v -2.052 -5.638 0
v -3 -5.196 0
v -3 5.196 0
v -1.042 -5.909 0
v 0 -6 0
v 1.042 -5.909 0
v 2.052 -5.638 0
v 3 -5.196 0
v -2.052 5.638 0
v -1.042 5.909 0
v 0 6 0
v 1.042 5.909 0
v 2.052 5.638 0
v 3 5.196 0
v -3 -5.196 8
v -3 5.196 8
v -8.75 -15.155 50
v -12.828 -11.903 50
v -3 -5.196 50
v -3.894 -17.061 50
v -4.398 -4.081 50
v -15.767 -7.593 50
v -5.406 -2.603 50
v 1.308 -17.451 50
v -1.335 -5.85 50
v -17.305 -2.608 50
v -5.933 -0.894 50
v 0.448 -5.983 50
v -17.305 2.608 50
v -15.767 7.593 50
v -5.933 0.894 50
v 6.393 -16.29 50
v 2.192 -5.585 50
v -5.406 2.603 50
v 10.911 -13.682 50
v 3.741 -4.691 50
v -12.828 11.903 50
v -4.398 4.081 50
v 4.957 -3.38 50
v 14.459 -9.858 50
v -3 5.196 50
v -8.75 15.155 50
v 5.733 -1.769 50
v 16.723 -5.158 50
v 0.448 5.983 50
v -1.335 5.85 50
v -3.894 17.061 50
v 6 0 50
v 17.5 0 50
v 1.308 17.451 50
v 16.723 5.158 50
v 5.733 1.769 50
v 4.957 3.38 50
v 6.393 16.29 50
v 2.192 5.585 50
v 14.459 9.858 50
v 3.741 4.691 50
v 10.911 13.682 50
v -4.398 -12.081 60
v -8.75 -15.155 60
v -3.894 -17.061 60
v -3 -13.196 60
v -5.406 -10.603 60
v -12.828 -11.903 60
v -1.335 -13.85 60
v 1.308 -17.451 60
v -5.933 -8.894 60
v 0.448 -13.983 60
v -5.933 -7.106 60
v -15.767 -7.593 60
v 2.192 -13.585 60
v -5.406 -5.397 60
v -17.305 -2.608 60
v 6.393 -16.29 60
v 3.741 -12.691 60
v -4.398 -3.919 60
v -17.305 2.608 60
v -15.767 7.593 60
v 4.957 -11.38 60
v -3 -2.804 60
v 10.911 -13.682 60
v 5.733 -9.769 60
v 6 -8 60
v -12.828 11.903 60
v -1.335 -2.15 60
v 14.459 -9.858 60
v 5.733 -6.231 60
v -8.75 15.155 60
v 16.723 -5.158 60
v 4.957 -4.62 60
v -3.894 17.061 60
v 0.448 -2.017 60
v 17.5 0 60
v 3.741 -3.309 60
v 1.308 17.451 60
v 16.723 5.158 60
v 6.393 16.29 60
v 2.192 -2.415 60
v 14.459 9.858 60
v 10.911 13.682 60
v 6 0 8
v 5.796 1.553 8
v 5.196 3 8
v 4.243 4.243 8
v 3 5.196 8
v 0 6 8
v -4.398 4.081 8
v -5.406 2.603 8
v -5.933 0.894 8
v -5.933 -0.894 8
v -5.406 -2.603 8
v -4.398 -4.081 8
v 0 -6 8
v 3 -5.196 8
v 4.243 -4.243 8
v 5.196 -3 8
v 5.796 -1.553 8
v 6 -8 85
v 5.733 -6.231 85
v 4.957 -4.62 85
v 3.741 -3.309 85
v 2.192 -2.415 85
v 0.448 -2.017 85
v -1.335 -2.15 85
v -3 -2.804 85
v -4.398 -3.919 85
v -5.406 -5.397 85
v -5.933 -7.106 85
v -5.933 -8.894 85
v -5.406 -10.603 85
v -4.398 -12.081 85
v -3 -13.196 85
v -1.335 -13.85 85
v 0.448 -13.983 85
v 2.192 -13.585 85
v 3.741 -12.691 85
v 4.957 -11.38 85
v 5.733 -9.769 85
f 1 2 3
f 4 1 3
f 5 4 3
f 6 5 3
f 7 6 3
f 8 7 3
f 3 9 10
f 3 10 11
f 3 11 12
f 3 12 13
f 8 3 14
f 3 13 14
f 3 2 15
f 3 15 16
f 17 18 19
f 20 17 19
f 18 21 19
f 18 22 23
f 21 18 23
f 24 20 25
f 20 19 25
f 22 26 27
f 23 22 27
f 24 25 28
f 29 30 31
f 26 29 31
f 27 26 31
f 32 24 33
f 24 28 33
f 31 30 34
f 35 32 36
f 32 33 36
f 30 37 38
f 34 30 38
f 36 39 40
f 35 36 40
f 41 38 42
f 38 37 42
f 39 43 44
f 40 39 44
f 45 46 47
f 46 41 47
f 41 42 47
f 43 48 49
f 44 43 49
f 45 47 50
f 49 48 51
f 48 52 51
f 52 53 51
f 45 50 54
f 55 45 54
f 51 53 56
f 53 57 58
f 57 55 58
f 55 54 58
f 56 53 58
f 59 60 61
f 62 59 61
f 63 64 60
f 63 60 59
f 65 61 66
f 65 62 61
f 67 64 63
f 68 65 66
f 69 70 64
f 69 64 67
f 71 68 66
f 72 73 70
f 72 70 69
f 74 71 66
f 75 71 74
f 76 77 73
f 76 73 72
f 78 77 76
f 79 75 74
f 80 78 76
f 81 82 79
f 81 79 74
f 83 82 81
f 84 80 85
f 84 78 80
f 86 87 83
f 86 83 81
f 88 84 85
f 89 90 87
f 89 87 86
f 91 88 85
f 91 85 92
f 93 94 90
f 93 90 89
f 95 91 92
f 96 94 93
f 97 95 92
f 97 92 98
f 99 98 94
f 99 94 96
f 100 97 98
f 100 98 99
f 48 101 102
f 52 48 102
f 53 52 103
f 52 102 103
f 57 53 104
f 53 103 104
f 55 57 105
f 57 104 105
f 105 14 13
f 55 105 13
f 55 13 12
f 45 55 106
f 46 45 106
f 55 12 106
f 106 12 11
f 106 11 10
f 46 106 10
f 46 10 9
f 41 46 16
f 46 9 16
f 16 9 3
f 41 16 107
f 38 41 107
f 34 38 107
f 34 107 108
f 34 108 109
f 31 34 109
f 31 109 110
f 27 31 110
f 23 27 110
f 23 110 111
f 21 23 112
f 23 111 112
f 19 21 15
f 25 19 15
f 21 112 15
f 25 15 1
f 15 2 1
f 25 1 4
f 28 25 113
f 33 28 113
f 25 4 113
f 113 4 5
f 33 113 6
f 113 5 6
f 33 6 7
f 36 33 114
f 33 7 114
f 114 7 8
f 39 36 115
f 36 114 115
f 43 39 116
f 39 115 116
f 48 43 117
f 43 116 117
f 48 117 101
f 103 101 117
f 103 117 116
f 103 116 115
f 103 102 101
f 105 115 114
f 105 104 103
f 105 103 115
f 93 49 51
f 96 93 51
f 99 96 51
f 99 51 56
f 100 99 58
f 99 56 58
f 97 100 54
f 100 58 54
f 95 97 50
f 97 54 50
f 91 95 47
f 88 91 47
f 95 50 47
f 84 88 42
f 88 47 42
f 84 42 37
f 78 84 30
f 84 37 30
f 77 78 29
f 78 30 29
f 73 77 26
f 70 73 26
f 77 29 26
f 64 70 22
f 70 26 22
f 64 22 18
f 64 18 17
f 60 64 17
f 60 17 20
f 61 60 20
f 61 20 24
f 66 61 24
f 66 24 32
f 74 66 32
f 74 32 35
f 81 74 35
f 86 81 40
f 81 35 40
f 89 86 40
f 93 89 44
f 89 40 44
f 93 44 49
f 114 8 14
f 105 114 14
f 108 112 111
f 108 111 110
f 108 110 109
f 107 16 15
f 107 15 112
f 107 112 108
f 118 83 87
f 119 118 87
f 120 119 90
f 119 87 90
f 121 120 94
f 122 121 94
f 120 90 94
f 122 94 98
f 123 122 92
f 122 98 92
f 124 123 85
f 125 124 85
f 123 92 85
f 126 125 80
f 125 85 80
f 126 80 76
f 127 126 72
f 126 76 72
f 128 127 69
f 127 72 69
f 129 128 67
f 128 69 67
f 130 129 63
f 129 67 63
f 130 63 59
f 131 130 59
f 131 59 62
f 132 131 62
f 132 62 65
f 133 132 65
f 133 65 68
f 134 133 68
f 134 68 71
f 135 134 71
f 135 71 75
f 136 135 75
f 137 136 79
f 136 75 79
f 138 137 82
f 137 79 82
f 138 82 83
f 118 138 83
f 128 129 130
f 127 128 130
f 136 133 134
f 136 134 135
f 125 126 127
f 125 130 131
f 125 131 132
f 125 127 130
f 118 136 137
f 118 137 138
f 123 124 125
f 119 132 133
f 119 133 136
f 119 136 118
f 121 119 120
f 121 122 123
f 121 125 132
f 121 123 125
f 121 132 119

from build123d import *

# Parameters (mm, degrees)
SKETCH1_R           = 6
BOSS_EXTRUDE1_DEPTH = 50
SKETCH2_R           = 17.5
BOSS_EXTRUDE2_DEPTH = 10
SKETCH3_R           = 6
BOSS_EXTRUDE3_DEPTH = 25
SKETCH4_OUTSIDE_W   = 56.672
SKETCH4_OUTSIDE_H   = 56.672
SKETCH4_OUTSIDE_W_2 = 6
SKETCH4_OUTSIDE_H_2 = 12
CUT_EXTRUDE2_DEPTH  = 8


with BuildPart() as part:
    # Sketch1 → Boss-Extrude1 (new body)
    with BuildSketch(Plane.XY):
        Circle(SKETCH1_R)
    extrude(amount=BOSS_EXTRUDE1_DEPTH)

    # Sketch2 → Boss-Extrude2 (add)
    with BuildSketch(Plane.XY.offset(50)):
        Circle(SKETCH2_R)
    extrude(amount=BOSS_EXTRUDE2_DEPTH)

    # Sketch3 → Boss-Extrude3 (add)
    with BuildSketch(Plane.XY.offset(60)):
        with Locations((0, -8)):
            Circle(SKETCH3_R)
    extrude(amount=BOSS_EXTRUDE3_DEPTH)

    # Sketch4 outside → Cut-Extrude2 (cut)
    with BuildSketch(Plane(origin=(0, 0, 0), x_dir=(-1, 0, 0), z_dir=(0, 0, -1))):
        Rectangle(SKETCH4_OUTSIDE_W, SKETCH4_OUTSIDE_H)
        Rectangle(SKETCH4_OUTSIDE_W_2, SKETCH4_OUTSIDE_H_2, mode=Mode.SUBTRACT)
    extrude(amount=-CUT_EXTRUDE2_DEPTH, mode=Mode.SUBTRACT)


solid = part.part
